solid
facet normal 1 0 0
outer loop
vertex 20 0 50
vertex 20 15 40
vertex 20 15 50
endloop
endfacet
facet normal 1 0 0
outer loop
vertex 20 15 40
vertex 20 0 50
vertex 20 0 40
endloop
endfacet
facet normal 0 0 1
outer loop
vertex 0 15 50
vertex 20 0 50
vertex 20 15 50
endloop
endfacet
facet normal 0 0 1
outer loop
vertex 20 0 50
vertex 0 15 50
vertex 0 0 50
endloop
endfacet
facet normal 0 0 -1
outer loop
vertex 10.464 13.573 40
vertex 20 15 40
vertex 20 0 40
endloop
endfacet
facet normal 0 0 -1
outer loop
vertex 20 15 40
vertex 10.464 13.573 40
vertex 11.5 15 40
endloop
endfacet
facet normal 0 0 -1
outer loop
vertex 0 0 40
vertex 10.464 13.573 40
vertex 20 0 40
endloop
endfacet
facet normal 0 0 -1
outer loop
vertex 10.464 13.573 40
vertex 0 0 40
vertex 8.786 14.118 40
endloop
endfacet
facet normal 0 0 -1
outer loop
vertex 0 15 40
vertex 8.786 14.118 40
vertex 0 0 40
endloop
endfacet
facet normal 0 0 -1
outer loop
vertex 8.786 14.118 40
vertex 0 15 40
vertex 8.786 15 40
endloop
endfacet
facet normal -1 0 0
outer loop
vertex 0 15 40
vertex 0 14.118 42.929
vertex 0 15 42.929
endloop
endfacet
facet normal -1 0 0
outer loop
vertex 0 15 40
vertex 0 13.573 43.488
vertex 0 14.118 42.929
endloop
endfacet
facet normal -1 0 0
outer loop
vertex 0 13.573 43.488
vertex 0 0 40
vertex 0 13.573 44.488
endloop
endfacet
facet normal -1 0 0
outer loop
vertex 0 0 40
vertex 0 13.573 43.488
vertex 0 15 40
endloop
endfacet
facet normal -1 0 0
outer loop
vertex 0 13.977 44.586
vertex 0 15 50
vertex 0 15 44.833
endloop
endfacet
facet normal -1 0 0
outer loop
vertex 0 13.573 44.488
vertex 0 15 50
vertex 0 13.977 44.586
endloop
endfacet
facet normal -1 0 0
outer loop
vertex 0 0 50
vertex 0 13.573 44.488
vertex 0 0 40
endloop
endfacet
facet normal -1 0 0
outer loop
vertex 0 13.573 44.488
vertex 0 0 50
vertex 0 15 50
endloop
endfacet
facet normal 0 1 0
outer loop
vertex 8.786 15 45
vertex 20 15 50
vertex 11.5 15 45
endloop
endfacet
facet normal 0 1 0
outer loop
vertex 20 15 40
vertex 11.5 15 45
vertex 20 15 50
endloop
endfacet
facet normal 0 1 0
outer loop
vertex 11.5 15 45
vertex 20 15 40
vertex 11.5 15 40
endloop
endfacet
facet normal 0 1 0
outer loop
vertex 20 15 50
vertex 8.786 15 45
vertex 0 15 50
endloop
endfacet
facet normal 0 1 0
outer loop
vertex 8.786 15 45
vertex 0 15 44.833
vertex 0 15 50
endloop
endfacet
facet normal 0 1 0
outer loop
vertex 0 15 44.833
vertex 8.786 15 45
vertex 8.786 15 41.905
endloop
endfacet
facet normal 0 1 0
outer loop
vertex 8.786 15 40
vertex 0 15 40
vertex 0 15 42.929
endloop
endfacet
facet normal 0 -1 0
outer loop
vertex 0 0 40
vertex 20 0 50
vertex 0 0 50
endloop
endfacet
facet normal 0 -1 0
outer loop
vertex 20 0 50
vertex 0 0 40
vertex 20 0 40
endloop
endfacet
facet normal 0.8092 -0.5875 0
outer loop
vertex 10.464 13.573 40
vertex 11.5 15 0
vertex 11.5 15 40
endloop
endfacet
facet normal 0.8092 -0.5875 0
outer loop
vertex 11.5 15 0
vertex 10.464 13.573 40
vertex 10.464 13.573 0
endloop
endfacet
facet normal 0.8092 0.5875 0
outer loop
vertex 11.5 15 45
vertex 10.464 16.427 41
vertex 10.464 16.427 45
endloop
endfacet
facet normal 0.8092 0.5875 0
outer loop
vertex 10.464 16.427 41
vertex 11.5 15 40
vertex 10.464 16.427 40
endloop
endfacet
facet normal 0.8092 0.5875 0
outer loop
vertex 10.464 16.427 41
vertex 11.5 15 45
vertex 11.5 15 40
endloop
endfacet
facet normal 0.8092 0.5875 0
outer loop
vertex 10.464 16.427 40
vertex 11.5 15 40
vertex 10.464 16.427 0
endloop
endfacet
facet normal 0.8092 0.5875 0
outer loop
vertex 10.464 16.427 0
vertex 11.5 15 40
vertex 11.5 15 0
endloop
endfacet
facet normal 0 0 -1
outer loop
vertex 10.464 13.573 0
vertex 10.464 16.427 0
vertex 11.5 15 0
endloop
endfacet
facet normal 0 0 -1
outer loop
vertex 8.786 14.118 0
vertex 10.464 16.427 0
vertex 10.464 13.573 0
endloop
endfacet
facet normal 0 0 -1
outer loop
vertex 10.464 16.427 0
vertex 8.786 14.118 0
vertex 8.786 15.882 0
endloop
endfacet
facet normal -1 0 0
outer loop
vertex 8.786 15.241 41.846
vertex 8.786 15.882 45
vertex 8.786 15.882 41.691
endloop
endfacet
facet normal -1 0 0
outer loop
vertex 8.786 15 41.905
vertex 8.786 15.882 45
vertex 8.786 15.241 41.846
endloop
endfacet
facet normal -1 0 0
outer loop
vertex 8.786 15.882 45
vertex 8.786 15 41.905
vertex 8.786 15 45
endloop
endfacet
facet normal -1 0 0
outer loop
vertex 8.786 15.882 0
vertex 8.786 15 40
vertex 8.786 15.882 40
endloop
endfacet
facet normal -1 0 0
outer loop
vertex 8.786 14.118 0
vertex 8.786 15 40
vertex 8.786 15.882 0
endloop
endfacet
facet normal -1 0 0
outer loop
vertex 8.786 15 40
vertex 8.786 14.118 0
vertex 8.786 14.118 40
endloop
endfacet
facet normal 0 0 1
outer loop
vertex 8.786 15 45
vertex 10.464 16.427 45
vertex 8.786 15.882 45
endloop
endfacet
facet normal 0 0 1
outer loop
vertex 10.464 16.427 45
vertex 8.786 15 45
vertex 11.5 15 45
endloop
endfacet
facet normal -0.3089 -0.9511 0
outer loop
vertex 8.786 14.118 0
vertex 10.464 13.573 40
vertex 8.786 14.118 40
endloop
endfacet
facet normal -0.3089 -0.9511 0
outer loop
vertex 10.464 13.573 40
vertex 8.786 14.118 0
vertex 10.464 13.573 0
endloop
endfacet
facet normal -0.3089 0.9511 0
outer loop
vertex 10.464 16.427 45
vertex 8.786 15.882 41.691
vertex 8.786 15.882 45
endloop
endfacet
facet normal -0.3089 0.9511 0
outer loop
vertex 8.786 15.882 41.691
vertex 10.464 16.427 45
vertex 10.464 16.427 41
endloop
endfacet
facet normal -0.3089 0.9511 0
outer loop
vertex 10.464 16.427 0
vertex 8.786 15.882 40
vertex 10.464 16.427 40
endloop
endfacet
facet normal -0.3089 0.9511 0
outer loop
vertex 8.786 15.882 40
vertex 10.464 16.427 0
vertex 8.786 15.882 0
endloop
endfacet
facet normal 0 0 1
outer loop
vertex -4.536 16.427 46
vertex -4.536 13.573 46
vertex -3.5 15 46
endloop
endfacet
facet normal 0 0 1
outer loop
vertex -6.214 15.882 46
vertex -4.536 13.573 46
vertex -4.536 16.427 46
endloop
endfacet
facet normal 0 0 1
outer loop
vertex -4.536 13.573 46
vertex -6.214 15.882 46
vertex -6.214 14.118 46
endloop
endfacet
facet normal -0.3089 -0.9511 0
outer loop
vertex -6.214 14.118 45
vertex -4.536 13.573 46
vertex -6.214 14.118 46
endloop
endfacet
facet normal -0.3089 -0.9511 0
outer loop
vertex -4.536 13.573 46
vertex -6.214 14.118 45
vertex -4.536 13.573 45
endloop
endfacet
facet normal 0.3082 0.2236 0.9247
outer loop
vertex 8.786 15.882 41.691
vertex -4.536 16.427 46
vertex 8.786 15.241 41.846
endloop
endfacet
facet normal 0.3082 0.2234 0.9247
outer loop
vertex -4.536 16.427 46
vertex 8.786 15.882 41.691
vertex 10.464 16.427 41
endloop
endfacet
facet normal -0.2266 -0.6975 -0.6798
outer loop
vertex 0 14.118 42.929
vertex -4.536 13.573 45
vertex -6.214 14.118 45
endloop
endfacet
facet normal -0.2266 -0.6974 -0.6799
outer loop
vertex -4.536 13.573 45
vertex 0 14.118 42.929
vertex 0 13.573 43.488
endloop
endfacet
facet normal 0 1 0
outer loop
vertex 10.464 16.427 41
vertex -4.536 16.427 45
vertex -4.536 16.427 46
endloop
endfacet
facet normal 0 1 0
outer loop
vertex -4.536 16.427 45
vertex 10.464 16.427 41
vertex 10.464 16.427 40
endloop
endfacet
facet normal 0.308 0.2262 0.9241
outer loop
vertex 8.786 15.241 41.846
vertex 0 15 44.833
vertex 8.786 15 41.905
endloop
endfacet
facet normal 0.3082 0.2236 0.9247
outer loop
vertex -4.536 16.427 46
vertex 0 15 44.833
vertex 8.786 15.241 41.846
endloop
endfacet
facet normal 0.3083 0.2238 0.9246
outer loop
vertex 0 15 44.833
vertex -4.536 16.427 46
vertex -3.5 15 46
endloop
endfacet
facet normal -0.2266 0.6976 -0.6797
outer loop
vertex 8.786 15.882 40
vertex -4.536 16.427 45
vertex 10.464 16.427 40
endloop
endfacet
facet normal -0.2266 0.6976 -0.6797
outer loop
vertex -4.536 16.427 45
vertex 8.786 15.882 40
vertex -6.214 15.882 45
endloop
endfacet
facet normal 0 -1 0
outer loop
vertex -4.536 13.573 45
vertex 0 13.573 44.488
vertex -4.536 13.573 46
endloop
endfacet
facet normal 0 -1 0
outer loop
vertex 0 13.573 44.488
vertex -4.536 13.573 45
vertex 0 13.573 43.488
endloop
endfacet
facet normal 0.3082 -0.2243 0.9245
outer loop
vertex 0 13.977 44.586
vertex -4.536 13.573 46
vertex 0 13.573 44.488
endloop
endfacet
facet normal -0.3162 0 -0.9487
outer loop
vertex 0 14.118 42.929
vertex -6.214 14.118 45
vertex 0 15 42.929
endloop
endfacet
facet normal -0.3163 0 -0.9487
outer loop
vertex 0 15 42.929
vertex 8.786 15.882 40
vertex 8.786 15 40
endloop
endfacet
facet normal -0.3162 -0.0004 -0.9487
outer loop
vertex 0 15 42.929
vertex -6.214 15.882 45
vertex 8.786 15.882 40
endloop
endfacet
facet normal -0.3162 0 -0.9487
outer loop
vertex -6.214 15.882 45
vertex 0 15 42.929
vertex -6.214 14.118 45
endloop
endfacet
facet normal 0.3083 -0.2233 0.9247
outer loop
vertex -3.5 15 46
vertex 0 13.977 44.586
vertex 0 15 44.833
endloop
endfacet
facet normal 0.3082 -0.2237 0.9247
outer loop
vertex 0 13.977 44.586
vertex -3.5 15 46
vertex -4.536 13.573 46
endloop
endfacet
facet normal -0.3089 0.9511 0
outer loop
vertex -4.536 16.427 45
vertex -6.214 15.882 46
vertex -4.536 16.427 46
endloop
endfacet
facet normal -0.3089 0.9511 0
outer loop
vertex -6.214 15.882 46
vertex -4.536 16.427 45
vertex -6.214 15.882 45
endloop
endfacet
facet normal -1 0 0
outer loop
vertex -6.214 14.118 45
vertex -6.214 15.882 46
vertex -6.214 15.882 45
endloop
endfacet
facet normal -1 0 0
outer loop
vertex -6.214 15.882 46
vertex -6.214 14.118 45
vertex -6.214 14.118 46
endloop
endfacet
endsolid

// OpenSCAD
// Parameters
hook_thickness = 3; // The thickness of the hook
hook_height = 50;   // The overall height of the hook
hook_width = 20;    // The width of the hook
hook_curve = 15;    // The curve of the hook (how far it extends outward)
hook_base = 10;     // The thickness of the base that attaches to the wall

// Base of the hook
translate([ 0, 0, hook_height - hook_base ]) cube([ hook_width, hook_curve, hook_base ]);

// Vertical part of the hook
hull()
{
    translate([ hook_width / 2, hook_curve, 0 ])
        cylinder(h = hook_height - hook_curve - hook_base / 2, r = hook_thickness / 2);

    translate([ hook_width / 2, hook_curve, hook_height - hook_curve - hook_base / 2 ])
        cylinder(h = hook_curve, r = hook_thickness / 2);
}

// Curved part of the hook
hull()
{
    translate([ hook_width / 2, hook_curve, hook_height - hook_base ]) cylinder(h = 1, r = hook_thickness / 2);

    translate([ hook_width / 2 - hook_curve, hook_curve, hook_height - hook_base / 2 ])
        cylinder(h = 1, r = hook_thickness / 2);
}
